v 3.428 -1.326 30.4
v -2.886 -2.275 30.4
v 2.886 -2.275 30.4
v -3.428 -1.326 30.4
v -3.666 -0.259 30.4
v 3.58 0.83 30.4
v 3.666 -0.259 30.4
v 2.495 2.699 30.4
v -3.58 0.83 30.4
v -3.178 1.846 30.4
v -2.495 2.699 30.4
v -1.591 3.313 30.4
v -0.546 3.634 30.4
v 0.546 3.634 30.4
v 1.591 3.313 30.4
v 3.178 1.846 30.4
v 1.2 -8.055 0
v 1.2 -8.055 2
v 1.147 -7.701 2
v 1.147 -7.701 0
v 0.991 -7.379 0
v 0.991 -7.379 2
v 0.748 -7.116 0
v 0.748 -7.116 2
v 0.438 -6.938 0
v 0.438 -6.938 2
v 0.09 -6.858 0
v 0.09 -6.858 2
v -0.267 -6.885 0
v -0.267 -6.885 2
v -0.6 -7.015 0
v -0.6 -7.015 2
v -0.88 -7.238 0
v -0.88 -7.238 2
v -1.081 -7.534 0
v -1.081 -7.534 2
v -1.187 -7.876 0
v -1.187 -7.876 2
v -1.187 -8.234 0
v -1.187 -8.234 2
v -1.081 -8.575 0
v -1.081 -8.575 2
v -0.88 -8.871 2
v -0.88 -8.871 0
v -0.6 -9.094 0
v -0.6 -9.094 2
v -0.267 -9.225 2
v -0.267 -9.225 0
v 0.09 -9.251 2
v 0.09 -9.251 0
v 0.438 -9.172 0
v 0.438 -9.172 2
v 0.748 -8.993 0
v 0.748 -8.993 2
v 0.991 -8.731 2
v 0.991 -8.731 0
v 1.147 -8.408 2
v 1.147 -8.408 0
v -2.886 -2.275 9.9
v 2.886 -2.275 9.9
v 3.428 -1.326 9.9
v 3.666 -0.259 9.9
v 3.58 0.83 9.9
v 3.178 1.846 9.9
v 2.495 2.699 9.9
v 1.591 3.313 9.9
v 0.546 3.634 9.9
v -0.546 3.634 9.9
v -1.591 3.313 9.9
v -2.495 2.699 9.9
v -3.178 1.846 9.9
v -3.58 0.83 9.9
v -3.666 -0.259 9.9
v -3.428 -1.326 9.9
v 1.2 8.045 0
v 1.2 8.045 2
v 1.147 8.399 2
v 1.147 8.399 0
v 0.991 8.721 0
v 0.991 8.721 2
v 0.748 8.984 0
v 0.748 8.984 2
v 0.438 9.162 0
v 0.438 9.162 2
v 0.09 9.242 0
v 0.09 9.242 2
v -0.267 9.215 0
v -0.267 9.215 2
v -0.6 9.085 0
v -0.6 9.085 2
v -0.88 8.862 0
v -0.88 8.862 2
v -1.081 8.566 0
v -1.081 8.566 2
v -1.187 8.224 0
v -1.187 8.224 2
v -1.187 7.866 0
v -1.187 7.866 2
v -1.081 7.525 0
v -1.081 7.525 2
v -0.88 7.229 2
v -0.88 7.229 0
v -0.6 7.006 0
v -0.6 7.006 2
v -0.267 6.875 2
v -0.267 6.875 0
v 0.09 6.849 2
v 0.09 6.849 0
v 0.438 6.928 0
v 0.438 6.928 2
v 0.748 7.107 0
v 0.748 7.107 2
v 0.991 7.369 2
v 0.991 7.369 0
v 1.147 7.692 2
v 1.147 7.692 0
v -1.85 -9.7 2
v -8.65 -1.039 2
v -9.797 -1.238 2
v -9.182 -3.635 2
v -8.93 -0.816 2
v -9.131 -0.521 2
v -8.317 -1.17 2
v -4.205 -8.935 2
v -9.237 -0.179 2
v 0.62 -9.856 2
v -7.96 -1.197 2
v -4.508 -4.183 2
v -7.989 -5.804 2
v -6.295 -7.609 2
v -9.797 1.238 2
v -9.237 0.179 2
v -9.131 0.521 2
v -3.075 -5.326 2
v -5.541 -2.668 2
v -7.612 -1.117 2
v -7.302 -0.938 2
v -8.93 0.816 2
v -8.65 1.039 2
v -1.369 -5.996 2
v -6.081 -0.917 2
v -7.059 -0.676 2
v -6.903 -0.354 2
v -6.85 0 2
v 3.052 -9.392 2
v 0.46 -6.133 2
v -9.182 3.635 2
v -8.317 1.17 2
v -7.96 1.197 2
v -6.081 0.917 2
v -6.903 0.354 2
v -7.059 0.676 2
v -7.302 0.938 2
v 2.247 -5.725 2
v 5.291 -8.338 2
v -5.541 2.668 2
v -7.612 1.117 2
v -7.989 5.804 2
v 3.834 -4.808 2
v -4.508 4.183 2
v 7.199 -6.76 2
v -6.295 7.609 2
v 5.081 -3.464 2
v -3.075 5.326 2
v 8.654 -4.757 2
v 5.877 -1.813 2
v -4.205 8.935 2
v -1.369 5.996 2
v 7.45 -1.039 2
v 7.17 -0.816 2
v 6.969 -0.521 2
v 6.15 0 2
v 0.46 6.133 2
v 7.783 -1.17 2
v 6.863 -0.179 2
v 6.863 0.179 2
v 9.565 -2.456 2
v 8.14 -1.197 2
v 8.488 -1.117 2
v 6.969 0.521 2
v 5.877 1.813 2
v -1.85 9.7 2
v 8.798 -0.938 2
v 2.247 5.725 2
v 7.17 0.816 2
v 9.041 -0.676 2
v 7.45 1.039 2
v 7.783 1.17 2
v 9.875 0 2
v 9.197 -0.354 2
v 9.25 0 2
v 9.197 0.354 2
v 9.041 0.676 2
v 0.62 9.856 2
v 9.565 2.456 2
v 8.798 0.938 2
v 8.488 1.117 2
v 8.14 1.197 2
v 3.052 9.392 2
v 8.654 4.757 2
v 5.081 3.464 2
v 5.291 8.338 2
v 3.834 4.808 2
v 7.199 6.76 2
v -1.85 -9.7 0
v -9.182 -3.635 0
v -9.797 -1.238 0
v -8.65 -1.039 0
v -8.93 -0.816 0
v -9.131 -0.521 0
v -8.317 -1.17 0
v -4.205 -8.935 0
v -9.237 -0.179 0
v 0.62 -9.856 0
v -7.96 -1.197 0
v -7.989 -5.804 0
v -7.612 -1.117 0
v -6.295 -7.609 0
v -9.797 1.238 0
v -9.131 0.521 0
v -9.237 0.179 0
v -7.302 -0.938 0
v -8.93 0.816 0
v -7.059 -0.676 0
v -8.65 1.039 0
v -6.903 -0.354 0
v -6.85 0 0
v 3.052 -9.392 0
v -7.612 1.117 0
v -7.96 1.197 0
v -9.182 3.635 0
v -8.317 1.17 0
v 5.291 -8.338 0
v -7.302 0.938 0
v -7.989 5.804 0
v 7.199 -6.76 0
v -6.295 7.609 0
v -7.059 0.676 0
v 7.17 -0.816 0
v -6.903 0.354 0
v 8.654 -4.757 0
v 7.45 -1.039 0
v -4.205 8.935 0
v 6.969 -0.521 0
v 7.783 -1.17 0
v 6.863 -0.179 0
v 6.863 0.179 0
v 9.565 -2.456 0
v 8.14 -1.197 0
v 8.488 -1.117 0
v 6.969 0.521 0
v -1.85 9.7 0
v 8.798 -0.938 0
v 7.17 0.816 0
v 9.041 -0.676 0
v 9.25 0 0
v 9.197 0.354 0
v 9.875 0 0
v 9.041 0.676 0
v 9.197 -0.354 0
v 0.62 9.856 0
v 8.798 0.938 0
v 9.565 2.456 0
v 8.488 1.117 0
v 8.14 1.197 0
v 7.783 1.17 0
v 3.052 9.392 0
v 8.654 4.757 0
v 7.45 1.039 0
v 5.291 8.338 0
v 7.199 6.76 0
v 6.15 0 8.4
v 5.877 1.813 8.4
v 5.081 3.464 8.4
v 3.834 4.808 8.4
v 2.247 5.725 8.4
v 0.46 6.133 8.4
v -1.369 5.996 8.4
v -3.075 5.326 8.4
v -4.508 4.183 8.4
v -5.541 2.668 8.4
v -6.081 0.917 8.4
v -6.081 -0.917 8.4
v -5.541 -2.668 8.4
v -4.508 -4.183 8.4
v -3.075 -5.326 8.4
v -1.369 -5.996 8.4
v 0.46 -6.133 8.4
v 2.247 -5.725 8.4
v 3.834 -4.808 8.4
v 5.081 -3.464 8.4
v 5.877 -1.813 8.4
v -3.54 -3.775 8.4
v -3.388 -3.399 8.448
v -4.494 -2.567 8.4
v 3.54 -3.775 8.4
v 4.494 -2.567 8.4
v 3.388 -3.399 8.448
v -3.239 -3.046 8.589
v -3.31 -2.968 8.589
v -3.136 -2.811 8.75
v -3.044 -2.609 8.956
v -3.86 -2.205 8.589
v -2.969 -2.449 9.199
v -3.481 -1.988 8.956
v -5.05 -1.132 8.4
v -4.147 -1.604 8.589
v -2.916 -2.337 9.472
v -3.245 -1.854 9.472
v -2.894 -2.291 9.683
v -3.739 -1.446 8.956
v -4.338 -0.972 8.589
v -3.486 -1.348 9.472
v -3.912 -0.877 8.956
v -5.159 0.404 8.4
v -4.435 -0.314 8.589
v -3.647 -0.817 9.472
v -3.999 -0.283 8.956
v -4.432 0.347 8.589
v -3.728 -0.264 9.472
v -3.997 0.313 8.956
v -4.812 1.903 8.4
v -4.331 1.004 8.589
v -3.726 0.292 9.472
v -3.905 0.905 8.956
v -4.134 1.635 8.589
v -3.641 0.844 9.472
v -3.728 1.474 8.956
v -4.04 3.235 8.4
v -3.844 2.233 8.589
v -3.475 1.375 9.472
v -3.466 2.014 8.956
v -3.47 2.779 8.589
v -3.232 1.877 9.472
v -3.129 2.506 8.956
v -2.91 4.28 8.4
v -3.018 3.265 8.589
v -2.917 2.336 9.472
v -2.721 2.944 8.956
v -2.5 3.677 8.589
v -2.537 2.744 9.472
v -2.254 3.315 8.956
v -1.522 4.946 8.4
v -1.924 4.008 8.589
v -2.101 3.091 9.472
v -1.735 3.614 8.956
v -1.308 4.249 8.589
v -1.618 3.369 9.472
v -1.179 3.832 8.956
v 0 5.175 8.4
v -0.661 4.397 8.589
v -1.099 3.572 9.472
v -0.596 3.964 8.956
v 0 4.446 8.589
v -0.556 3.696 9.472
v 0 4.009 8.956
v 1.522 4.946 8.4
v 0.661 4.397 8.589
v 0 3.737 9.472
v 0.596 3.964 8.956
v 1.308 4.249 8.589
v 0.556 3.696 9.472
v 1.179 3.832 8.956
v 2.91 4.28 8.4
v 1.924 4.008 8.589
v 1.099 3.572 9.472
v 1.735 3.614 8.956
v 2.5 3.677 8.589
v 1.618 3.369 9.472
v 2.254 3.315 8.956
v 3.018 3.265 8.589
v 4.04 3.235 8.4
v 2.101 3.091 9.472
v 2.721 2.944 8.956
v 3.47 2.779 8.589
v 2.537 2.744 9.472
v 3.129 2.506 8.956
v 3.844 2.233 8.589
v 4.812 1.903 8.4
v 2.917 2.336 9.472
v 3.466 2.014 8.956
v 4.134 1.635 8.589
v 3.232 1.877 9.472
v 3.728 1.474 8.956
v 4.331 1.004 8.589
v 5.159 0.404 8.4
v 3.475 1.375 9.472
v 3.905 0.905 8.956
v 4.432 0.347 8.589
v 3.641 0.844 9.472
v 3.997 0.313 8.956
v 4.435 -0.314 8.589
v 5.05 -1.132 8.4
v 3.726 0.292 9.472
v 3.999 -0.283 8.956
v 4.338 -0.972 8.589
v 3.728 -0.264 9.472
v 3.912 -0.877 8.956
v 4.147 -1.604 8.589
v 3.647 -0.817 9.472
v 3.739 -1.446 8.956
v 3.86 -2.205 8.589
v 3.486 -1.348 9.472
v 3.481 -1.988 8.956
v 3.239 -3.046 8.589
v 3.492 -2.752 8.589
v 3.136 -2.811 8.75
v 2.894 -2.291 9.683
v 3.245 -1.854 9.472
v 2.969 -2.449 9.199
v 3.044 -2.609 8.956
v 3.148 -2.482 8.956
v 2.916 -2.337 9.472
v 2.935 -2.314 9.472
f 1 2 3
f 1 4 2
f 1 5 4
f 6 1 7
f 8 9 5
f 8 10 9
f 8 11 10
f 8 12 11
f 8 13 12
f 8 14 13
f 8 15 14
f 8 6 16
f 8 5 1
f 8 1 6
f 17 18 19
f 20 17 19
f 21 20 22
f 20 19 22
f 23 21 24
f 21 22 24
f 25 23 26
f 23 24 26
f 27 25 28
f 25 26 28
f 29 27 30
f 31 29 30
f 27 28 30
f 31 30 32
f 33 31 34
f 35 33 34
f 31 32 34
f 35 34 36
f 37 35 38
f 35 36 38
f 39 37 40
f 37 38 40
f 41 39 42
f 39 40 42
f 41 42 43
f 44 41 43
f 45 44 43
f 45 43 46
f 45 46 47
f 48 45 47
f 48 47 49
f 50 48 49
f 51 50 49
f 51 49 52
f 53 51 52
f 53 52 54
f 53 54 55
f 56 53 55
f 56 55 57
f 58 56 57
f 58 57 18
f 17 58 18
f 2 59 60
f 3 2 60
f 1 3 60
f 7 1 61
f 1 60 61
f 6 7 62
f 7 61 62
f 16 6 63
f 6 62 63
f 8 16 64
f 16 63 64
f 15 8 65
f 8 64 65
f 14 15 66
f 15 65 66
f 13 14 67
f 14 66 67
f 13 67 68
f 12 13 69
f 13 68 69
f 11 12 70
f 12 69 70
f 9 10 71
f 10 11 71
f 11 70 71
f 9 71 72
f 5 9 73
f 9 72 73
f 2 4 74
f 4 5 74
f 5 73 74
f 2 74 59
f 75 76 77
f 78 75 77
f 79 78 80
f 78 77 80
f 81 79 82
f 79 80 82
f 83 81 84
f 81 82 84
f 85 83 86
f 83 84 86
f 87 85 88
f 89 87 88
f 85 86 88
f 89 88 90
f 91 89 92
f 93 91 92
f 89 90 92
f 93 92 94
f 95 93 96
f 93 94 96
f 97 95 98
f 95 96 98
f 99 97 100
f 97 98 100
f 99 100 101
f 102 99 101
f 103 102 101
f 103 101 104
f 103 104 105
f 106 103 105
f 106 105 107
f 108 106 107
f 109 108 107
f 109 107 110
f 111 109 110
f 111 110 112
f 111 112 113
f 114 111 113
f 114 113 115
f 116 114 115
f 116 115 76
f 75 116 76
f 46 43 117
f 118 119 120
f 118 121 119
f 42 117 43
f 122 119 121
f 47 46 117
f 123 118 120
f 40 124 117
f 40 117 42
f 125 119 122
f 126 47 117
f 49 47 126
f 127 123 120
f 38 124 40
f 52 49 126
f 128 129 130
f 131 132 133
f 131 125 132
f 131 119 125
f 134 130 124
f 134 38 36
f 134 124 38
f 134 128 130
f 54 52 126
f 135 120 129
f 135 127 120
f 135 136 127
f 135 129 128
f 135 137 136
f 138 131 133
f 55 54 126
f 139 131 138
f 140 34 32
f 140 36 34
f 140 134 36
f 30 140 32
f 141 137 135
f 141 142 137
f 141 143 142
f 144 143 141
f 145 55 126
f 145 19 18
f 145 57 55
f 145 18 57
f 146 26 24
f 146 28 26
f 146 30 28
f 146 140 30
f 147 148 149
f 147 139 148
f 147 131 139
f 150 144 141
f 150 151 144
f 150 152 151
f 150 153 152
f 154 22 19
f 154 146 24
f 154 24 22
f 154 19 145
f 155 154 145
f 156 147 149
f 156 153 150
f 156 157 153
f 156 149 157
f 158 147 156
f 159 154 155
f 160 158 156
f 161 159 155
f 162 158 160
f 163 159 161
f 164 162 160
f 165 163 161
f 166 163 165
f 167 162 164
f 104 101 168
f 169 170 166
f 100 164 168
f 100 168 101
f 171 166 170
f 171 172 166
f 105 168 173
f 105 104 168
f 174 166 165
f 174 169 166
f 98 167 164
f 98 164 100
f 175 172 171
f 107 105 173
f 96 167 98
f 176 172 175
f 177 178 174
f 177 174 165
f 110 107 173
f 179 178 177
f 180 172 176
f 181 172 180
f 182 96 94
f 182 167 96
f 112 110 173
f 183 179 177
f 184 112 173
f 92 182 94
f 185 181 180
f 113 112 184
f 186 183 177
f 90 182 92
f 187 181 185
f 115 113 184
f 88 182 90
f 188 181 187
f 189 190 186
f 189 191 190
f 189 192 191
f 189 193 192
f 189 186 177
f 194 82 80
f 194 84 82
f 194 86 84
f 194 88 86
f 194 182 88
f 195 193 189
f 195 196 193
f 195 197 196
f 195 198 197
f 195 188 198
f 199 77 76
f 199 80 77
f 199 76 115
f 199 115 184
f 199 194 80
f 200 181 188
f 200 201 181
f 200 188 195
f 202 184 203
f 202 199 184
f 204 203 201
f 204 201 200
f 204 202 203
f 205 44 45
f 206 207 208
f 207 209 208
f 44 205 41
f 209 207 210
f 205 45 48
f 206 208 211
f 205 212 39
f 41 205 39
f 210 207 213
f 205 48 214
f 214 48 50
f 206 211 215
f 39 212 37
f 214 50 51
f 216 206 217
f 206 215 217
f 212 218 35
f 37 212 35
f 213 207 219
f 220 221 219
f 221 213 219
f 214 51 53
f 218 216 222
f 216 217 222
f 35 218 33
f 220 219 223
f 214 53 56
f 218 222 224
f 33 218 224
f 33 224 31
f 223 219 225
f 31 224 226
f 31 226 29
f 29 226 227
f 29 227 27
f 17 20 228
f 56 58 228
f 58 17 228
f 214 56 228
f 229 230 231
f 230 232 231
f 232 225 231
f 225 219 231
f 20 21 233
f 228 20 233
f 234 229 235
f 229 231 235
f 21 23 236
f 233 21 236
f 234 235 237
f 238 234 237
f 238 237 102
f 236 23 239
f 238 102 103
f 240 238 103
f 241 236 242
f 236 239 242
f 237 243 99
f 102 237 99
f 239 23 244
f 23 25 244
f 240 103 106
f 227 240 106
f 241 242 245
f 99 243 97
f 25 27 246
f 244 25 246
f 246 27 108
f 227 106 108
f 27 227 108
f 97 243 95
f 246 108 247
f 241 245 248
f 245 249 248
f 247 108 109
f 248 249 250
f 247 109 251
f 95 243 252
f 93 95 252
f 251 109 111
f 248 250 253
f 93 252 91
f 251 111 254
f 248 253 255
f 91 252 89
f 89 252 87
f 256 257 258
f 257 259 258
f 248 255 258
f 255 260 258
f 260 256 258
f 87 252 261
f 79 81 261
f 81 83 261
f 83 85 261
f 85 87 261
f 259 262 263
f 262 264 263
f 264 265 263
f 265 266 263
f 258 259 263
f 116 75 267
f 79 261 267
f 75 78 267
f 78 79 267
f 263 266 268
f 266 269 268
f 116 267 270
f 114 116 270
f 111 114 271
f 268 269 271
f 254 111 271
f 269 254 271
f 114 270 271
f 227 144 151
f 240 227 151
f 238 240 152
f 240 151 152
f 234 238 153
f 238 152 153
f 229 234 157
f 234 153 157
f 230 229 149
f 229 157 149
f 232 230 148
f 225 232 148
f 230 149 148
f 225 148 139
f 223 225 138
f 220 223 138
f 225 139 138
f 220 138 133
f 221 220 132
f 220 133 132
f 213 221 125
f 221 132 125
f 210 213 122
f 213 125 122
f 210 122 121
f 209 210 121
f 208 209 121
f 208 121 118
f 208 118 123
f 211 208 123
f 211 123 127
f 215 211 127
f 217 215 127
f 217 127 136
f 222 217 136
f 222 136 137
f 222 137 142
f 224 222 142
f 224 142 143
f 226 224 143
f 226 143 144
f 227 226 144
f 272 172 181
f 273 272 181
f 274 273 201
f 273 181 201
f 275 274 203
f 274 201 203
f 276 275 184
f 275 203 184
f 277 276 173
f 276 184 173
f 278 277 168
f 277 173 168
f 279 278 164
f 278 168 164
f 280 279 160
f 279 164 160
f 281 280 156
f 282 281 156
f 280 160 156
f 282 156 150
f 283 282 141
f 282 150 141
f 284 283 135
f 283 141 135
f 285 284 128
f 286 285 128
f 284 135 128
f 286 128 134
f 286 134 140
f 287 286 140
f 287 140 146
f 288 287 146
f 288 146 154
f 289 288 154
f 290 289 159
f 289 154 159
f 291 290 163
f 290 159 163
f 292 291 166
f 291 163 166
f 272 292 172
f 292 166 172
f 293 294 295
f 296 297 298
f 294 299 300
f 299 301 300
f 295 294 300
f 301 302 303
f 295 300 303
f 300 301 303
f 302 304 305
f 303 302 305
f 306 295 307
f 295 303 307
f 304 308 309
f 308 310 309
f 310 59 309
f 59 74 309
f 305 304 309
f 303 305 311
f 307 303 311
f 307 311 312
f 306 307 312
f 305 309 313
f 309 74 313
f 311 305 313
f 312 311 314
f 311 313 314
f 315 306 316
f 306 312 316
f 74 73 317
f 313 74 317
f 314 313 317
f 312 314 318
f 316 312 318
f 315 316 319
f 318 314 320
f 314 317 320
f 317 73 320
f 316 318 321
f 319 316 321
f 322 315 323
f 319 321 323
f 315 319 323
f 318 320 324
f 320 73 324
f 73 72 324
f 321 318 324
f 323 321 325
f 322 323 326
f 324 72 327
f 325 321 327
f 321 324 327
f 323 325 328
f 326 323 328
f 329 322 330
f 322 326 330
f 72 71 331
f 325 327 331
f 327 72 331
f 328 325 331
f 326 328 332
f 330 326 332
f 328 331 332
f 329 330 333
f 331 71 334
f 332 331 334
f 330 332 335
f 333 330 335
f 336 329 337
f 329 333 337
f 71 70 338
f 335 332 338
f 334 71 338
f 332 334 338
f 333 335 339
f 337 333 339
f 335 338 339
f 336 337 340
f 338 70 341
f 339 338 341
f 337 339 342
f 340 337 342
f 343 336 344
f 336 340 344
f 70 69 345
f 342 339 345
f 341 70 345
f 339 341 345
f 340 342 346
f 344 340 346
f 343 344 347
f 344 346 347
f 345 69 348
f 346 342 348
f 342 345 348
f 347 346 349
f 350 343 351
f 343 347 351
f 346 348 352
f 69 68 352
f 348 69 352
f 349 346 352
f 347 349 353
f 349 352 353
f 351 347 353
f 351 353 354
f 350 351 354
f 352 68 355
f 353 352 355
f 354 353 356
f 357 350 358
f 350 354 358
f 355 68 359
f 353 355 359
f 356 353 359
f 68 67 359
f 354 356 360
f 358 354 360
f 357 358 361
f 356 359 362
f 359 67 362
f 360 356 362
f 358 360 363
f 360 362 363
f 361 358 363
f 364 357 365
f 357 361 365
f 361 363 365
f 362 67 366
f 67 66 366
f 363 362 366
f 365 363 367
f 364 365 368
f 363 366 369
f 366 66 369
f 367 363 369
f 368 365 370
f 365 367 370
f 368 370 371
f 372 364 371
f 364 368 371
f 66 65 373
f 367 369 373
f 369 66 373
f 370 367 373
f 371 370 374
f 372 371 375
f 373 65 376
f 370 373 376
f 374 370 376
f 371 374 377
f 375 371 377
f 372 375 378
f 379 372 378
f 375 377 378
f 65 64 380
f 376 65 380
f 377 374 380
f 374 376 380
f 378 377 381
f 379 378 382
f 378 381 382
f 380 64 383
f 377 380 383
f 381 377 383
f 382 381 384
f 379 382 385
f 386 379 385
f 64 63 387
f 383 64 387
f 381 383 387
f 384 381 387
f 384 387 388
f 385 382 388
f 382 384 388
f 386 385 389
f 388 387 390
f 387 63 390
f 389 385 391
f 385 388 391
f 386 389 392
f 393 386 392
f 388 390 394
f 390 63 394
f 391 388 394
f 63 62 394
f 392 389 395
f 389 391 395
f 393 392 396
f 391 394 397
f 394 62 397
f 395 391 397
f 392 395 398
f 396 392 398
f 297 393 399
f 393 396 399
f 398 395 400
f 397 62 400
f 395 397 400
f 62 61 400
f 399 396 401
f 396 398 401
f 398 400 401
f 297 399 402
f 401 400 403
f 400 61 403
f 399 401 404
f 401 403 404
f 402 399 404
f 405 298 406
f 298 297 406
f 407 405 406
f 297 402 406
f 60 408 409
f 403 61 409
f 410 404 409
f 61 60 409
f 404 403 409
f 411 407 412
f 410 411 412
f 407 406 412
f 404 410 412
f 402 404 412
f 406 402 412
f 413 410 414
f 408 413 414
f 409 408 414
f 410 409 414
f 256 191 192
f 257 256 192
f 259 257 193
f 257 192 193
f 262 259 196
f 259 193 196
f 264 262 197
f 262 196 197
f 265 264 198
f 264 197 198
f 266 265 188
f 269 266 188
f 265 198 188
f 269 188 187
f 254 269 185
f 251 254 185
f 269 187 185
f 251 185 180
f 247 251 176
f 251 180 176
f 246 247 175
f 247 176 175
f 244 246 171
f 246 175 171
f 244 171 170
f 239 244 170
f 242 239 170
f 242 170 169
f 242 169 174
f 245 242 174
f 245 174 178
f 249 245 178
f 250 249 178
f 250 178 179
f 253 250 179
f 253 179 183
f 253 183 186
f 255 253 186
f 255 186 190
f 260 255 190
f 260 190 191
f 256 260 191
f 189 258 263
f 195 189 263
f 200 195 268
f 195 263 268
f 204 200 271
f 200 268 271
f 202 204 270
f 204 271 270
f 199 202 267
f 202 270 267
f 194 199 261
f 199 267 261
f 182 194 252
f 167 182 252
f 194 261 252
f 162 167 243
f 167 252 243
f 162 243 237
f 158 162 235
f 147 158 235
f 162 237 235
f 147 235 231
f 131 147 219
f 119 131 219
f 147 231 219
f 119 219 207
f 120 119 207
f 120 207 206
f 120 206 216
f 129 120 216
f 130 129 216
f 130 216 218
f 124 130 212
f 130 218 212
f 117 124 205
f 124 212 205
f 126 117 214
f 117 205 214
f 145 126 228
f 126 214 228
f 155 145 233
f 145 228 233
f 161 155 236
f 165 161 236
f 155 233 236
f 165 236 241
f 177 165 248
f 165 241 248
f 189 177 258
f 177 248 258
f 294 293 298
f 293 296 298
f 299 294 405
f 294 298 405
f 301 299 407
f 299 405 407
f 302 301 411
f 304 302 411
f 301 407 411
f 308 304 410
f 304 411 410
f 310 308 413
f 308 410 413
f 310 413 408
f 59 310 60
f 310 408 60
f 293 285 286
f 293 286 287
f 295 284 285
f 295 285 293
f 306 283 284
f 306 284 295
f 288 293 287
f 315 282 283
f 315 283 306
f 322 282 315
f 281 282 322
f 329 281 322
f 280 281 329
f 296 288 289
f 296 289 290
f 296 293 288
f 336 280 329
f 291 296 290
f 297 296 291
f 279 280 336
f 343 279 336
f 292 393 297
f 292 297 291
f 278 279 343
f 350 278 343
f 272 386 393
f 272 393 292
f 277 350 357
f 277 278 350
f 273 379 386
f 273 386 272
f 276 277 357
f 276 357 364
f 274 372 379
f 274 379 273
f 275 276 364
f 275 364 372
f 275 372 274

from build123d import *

# Parameters (mm, degrees)
ESQUISSE1_R             = 9.875
BOSS_EXTRU_1_DEPTH      = 2
ESQUISSE2_R             = 6.15
BOSS_EXTRU_2_DEPTH      = 6.4
ESQUISSE3_R             = 3.675
BOSS_EXTRU_3_DEPTH      = 22
ENL_V_START             = -22
ENL_V_MAT_EXTRU_1_DEPTH = 22
ESQUISSE5_R             = 1.2
ENL_V_MAT_EXTRU_2_DEPTH = 32.647926472
CONG_1_R                = 1.5


with BuildPart() as part:
    # Esquisse1 → Boss.-Extru.1 (new body)
    with BuildSketch(Plane.XY):
        Circle(ESQUISSE1_R)
    extrude(amount=BOSS_EXTRU_1_DEPTH)

    # Esquisse2 → Boss.-Extru.2 (add)
    with BuildSketch(Plane.XY.offset(2)):
        Circle(ESQUISSE2_R)
    extrude(amount=BOSS_EXTRU_2_DEPTH)

    # Esquisse3 → Boss.-Extru.3 (add)
    with BuildSketch(Plane.XY.offset(8.4)):
        Circle(ESQUISSE3_R)
    extrude(amount=BOSS_EXTRU_3_DEPTH)

    # Esquisse4 → Enlèv. mat.-Extru.1 (cut)
    with BuildSketch(Plane.XY.offset(30.4).offset(ENL_V_START)):
        with BuildLine():
            Line((-2.886173938, -2.275), (2.886173938, -2.275))
            ThreePointArc((2.886173938, -2.275), (0, -3.675), (-2.886173938, -2.275))
        make_face()
    extrude(amount=ENL_V_MAT_EXTRU_1_DEPTH, mode=Mode.SUBTRACT)

    # Esquisse5 → Enlèv. mat.-Extru.2 (cut, through all)
    with BuildSketch(Plane.XY.offset(2)):
        with Locations((0, 8.045346172)):
            Circle(ESQUISSE5_R)
        with Locations((0, -8.054653828)):
            Circle(ESQUISSE5_R)
        with Locations((-8.05, 0)):
            Circle(ESQUISSE5_R)
        with Locations((8.05, 0)):
            Circle(ESQUISSE5_R)
    extrude(amount=-ENL_V_MAT_EXTRU_2_DEPTH, mode=Mode.SUBTRACT)

    # Congé1
    cong_1_edges = [part.edges().sort_by_distance(p)[0] for p in [
        (0, 3.675, 8.4),
        (0, -2.275, 8.4),
    ]]
    fillet(cong_1_edges, radius=CONG_1_R)


solid = part.part
